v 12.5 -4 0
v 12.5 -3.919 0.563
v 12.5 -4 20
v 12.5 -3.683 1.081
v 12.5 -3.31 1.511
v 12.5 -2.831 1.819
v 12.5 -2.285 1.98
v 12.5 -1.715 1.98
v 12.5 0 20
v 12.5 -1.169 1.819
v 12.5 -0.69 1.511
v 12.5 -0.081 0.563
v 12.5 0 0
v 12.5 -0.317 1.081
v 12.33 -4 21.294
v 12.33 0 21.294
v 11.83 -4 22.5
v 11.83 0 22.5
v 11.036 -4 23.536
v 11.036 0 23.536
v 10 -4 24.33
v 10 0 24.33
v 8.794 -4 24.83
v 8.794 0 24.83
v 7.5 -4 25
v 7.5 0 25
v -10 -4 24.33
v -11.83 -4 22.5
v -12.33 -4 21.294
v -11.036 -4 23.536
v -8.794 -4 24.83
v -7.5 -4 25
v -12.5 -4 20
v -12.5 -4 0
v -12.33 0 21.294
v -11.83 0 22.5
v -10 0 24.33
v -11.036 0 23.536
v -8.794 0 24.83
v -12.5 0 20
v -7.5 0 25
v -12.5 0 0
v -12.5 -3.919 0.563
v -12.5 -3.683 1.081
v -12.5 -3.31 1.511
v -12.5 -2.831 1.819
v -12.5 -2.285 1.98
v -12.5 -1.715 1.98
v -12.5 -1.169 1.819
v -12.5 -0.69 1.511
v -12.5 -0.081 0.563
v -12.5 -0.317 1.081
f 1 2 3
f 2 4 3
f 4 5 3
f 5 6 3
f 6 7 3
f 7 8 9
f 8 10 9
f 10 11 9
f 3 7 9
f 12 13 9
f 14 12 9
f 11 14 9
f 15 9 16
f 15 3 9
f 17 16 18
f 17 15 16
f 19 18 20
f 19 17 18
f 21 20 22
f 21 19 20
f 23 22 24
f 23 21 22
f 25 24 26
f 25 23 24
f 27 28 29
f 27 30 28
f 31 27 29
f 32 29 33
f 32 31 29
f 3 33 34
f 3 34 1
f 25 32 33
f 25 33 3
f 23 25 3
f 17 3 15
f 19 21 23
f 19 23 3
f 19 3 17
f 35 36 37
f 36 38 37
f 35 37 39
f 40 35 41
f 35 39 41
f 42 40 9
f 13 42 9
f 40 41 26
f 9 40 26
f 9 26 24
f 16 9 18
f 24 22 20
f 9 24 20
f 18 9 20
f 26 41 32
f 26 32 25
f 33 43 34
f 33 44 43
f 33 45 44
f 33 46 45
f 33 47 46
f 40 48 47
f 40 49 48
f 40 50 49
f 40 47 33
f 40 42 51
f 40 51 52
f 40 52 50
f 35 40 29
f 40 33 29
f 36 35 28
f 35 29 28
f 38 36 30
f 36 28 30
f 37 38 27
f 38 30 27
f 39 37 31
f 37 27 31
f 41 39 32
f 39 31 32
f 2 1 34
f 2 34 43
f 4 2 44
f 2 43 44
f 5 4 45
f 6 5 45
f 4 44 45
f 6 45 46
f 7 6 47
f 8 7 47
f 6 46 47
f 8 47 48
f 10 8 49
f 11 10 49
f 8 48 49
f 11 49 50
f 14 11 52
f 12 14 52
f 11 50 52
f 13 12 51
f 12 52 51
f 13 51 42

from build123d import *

# Parameters (mm, degrees)
F0_W     = 25
F0_H     = 25
F1_DEPTH = 4
F2_R     = 5
F4_D     = 4


with BuildPart() as f1:
    # F0 (on Front) → F1 (new body)
    with BuildSketch(Plane.XZ):
        with Locations((0, 12.5)):
            Rectangle(F0_W, F0_H)
    extrude(amount=F1_DEPTH)

    # F2
    f2_edges = [f1.edges().sort_by_distance(p)[0] for p in [
        (-12.5, -2, 25),
        (12.5, -2, 25),
    ]]
    fillet(f2_edges, radius=F2_R)

    # F4 (through all)
    with Locations(Plane.YZ.offset(12.5)):
        with Locations((-2, 0)):
            Hole(F4_D / 2)


solid = f1.part
